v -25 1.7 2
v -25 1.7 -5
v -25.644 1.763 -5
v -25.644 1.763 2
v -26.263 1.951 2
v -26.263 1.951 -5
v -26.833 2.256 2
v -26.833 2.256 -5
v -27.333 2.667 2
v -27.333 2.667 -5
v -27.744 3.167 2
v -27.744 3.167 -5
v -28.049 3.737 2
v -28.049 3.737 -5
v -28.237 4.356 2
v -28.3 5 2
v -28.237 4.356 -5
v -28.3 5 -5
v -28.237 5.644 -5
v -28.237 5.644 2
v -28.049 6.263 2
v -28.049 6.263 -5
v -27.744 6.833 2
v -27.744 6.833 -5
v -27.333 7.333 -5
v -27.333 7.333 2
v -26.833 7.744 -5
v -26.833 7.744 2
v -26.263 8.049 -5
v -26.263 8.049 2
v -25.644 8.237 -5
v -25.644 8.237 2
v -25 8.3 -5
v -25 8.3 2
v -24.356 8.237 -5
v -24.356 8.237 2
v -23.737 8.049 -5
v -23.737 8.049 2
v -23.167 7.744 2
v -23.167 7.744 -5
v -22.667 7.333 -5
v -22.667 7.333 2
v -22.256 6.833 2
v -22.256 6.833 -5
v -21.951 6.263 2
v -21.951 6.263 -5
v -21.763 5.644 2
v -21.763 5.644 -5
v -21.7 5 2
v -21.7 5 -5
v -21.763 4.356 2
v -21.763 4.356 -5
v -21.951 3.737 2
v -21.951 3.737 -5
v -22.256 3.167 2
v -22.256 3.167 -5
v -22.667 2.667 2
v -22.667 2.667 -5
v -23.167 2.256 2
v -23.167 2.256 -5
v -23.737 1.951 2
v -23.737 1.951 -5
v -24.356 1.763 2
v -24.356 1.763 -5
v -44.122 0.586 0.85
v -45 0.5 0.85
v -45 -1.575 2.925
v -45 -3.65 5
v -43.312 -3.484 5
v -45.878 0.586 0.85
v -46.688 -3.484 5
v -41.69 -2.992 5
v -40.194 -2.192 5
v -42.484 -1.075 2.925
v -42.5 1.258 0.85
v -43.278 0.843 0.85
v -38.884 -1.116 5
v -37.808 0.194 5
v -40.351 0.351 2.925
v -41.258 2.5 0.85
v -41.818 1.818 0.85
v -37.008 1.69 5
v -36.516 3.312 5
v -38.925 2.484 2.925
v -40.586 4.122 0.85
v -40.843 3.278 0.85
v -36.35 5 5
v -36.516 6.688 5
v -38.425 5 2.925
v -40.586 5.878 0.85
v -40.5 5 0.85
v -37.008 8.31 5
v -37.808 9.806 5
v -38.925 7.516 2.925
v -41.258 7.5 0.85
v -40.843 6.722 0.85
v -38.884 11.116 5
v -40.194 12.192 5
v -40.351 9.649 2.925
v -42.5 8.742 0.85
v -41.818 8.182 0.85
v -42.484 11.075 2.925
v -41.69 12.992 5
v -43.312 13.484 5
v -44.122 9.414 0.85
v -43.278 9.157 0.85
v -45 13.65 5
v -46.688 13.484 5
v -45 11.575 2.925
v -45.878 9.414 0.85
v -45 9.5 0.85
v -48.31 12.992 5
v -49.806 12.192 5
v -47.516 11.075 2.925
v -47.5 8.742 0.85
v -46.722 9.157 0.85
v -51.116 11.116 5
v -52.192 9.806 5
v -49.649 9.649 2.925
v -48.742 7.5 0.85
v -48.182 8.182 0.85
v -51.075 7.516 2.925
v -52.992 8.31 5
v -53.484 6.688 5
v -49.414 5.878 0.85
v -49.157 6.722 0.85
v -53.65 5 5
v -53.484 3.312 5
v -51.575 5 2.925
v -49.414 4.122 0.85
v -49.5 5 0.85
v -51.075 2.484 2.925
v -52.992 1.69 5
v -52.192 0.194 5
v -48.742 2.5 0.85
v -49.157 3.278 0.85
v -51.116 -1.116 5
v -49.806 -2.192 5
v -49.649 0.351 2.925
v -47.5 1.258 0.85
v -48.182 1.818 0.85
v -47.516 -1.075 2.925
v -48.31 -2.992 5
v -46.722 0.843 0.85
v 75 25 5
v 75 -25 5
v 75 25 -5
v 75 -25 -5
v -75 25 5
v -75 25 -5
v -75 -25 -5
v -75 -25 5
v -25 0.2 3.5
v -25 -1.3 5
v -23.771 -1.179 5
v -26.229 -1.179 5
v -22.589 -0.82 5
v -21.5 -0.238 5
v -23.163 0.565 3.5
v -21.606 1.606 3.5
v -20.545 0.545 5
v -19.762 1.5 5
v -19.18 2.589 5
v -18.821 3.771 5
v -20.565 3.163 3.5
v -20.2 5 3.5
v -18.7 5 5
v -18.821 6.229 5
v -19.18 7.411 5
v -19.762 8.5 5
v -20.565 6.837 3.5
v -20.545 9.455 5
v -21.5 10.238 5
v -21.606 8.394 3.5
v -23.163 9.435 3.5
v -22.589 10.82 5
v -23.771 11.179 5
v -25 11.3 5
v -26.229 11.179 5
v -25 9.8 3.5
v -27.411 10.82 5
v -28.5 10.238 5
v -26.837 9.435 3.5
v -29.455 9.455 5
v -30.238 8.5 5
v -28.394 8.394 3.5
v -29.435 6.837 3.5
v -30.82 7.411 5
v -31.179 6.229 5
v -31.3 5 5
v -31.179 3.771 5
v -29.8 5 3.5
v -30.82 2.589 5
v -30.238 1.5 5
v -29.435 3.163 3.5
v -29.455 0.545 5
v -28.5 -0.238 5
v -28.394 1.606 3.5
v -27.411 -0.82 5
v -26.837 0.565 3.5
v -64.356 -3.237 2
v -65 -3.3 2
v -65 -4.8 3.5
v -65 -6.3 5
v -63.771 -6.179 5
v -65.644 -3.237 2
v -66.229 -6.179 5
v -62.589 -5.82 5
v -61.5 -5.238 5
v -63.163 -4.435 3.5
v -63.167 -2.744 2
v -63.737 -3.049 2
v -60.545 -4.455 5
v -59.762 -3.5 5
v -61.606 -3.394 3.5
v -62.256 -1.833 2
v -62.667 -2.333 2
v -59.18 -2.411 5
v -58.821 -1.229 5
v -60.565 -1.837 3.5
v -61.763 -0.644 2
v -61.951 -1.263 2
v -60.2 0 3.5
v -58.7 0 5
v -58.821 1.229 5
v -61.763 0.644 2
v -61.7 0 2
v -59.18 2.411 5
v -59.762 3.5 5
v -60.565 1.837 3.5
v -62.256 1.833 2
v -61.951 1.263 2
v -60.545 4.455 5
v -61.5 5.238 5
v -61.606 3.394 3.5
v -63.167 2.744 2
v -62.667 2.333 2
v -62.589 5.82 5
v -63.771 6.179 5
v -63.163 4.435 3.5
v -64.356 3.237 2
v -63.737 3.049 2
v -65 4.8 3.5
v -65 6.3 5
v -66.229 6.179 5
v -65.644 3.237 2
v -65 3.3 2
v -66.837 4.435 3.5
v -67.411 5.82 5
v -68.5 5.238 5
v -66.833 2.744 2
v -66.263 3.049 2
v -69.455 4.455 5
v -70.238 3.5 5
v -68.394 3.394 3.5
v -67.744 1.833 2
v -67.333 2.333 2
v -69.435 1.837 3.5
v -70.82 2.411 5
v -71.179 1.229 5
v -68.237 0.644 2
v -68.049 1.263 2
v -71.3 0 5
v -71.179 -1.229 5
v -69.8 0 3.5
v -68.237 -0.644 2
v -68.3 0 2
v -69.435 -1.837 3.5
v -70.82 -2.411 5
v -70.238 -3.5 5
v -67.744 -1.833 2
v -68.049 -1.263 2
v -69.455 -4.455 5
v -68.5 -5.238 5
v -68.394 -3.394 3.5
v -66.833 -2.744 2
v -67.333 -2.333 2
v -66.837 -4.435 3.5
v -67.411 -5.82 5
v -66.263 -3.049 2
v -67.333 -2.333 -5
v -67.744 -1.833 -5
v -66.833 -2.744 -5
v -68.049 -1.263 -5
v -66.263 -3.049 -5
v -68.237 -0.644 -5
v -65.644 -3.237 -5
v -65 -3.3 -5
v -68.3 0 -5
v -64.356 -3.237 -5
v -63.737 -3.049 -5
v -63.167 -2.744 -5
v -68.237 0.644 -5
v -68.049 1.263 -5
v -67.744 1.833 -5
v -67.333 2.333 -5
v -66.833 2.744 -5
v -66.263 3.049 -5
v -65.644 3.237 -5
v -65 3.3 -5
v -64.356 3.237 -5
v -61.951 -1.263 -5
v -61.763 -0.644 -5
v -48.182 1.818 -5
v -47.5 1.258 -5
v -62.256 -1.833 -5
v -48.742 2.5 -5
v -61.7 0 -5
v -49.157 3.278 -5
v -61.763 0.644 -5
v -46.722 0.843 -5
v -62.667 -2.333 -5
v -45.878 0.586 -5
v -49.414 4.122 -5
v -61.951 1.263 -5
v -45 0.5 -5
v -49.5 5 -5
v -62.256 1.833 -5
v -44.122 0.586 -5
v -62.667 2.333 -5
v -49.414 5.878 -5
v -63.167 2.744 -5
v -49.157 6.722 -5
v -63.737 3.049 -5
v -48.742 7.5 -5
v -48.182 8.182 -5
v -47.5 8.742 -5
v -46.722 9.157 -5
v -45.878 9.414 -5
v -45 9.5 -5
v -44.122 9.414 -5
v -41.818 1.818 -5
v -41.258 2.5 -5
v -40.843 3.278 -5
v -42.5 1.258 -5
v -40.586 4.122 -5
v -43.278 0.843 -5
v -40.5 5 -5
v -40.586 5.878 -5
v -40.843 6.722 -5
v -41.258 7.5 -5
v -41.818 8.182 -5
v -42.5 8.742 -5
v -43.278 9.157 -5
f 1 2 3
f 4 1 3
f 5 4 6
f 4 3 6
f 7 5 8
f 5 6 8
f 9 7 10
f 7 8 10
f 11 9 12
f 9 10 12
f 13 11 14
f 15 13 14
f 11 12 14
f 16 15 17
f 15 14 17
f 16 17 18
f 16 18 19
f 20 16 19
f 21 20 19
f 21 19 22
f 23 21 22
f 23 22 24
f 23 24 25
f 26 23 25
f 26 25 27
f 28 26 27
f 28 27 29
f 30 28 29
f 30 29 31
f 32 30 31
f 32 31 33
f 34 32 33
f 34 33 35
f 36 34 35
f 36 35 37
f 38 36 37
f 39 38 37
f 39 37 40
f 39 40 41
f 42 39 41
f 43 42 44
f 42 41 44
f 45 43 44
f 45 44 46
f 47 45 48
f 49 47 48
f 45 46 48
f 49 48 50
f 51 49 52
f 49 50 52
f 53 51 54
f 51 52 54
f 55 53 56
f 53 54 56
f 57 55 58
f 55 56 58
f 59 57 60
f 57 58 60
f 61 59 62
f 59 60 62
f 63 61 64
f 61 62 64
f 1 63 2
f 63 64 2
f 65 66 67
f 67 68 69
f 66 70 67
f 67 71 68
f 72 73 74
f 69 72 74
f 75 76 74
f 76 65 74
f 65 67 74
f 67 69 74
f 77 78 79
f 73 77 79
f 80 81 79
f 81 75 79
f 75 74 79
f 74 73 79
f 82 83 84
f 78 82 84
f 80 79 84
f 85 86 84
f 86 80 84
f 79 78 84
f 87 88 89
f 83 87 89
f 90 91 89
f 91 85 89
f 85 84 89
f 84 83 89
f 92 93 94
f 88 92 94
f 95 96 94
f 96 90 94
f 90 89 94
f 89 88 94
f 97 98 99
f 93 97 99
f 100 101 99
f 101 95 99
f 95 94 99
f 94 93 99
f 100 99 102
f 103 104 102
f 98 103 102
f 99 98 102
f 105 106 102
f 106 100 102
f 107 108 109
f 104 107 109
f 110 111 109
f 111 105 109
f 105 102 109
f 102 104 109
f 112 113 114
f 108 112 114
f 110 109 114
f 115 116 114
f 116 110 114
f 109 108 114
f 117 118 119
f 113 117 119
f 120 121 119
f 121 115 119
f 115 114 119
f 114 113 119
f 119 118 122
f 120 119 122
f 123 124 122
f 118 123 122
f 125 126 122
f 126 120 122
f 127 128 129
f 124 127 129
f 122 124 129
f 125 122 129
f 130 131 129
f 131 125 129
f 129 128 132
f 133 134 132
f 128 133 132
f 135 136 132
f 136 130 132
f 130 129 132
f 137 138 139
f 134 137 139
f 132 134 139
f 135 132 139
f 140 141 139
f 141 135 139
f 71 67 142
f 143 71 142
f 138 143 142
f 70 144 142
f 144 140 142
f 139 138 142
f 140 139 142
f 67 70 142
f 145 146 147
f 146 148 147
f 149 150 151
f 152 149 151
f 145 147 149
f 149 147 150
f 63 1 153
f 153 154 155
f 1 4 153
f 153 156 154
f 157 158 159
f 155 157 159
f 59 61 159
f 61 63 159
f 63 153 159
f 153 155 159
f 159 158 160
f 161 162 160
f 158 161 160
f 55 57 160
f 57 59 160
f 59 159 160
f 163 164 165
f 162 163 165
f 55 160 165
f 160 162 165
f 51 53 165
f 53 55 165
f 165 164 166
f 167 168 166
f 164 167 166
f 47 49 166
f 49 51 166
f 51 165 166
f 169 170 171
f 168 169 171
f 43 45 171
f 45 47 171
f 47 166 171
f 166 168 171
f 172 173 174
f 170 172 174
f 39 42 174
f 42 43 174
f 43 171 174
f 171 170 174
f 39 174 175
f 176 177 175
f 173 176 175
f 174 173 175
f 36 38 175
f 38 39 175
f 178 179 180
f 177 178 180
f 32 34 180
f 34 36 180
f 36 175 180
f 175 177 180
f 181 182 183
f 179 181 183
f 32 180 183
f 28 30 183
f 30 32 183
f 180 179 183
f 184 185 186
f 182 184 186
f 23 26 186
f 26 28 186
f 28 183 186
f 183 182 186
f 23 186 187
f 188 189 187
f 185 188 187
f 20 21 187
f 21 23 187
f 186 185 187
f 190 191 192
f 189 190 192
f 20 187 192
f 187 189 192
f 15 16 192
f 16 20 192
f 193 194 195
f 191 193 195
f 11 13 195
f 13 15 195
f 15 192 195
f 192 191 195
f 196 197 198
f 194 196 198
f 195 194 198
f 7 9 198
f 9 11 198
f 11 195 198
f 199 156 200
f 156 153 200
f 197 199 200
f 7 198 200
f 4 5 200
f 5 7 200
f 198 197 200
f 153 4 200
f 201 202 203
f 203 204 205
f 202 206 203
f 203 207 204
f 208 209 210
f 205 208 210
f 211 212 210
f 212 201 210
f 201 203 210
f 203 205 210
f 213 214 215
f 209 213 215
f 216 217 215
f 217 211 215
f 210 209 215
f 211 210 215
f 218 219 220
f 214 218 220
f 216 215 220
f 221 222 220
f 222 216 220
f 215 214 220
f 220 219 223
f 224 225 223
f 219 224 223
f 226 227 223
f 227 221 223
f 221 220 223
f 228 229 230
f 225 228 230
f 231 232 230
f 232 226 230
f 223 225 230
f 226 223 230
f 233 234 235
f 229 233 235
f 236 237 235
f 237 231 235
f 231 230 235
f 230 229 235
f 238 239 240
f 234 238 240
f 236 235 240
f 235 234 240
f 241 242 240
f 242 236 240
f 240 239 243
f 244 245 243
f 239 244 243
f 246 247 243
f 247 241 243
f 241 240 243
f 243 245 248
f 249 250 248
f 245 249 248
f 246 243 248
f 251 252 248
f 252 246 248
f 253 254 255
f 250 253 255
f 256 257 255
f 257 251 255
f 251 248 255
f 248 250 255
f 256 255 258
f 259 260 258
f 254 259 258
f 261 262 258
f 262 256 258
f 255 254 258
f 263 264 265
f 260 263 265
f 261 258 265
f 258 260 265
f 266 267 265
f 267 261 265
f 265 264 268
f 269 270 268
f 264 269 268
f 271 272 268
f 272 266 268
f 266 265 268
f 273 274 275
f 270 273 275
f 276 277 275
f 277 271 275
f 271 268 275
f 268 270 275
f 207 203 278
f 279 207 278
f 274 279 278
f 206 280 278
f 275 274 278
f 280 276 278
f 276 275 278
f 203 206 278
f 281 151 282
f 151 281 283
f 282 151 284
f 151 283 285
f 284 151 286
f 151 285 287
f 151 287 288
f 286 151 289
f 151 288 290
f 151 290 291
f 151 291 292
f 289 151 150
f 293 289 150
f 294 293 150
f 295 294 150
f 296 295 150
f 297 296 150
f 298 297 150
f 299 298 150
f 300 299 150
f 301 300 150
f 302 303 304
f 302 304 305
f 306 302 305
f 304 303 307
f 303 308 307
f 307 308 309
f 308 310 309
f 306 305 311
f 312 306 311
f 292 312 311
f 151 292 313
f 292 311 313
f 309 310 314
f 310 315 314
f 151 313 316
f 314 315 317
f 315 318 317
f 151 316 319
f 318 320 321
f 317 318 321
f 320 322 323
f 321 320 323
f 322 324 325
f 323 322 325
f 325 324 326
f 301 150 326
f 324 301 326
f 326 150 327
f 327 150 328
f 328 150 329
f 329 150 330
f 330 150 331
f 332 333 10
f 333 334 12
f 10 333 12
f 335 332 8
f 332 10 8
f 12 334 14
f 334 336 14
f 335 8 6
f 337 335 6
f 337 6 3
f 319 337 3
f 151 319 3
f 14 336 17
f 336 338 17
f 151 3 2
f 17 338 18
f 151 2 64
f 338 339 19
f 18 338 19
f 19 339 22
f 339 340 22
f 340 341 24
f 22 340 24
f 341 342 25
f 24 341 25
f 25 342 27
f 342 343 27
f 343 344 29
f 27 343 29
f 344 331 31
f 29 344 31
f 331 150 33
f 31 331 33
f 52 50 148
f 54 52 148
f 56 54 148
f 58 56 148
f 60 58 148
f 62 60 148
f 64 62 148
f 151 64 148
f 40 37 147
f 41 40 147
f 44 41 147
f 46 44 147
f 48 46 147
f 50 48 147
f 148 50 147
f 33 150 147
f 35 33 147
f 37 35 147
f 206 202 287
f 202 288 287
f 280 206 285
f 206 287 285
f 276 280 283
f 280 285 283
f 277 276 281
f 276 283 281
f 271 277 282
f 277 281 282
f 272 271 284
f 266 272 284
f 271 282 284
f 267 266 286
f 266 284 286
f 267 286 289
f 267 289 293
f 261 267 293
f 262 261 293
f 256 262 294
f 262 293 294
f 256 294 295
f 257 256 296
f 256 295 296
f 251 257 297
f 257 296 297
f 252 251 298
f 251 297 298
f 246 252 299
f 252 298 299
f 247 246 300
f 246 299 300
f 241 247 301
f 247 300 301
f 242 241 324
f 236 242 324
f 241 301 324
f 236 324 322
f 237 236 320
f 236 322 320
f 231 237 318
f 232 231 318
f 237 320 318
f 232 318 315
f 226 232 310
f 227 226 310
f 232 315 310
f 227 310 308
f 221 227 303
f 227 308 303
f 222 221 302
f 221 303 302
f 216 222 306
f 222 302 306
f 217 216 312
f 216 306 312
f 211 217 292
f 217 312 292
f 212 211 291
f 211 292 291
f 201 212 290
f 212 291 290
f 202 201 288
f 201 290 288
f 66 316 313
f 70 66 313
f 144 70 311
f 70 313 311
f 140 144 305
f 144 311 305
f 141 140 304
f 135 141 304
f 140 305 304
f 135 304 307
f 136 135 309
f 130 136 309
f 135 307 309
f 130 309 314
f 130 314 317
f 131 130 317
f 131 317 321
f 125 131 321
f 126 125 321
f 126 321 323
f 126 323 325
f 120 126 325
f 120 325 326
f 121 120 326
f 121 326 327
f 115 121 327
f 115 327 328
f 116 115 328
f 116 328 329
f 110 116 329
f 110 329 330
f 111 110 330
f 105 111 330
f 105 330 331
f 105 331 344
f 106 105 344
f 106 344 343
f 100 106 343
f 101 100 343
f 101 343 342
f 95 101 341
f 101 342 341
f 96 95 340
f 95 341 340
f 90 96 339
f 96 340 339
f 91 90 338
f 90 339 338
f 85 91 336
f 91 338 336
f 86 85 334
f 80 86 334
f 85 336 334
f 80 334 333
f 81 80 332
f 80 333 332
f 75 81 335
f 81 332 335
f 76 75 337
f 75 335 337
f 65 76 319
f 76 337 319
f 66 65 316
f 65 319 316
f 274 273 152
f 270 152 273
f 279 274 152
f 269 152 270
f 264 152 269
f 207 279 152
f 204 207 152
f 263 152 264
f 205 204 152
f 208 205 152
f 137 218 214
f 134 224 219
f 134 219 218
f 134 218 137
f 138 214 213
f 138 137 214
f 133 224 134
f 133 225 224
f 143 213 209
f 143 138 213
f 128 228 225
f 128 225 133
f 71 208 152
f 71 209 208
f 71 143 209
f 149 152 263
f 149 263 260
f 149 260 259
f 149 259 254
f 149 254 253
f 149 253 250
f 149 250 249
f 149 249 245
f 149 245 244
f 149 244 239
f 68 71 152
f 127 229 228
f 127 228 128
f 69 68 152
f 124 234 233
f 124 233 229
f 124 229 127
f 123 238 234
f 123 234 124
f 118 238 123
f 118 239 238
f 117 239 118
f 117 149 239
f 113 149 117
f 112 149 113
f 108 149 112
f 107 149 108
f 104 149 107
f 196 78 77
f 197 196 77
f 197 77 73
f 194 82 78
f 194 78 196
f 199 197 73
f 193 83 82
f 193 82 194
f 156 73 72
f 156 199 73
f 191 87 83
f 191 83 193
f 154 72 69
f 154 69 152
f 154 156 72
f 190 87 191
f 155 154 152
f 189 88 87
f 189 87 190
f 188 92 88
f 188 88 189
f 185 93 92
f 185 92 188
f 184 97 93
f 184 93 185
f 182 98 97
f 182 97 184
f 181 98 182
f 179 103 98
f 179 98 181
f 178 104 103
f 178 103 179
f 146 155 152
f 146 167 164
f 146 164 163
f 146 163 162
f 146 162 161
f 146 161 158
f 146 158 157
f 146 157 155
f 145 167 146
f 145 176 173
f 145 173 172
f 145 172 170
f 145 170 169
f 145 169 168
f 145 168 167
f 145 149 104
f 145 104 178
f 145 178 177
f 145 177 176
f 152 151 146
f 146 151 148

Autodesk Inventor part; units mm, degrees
ref_plane "YZ Plane" through (0, 0, 0) normal (1, 0, 0) x (0, 1, 0)
ref_plane "XZ Plane" through (0, 0, 0) normal (0, 1, 0) x (-1, 0, 0)
ref_plane "XY Plane" through (0, 0, 0) normal (0, 0, 1) x (1, 0, 0)
sketch "Sketch2" plane through (0, 0, 0) normal (0, 0, 1) x (1, 0, 0)
  line L0 (-75, -25) -> (75, -25)
  line L1 (75, -25) -> (75, 25)
  line L2 (75, 25) -> (-75, 25)
  line L3 (-75, 25) -> (-75, -25)
  line L4 (-75, -25) -> (75, 25) construction
  line L5 (75, -25) -> (-75, 25) construction
  point P0 (0, 0)
  dimension "d1" = 150
  dimension "d2" = 50
extrude "Extrusion1" add sketch "Sketch2" along normal mid plane 10
sketch "Sketch3" plane through (0, 0, 5) normal (0, 0, 1) x (1, 0, 0)
  line L0 (-75, 25) -> (-75, -25) projected
  line L1 (75, 25) -> (-75, 25) projected
  point P0 (0, 0)
  point P1 (-65, 0)
  dimension "d40" = 10
  dimension "d43" = 25
hole "Hole1" at (-65, 0, 5) direction (0, 0, -1) diameter 6.6 depth 14.2 tip angle 118 countersink diameter 12.6 countersink angle 90 clearance for "Counter Sink" size "M6" standard "TS Profile"
sketch "Sketch4" plane through (0, 0, 5) normal (0, 0, 1) x (1, 0, 0)
  line L0 (-75, 25) -> (-75, -25) projected
  line L1 (75, 25) -> (-75, 25) projected
  point P0 (0, 0)
  point P1 (-45, 5)
  dimension "d41" = 30
  dimension "d42" = 20
hole "Hole2" at (-45, 5, 5) direction (0, 0, -1) diameter 9 depth 14.2 tip angle 118 countersink diameter 17.3 countersink angle 90 clearance for "Counter Sink" size "M8" standard "TS Profile"
sketch "Sketch5" plane through (0, 0, 5) normal (0, 0, 1) x (1, 0, 0)
  line L0 (-75, 25) -> (-75, -25) projected
  line L1 (75, 25) -> (-75, 25) projected
  point P0 (0, 0)
  point P1 (-25, 5)
  dimension "d44" = 50
  dimension "d45" = 20
hole "Hole3" at (-25, 5, 5) direction (0, 0, -1) diameter 6.6 depth 14.2 tip angle 118 countersink diameter 12.6 countersink angle 90 clearance for "Counter Sink" size "M6" standard "TS Profile"
properties part number "홀간 거리 확인 파트-10_CPY" material "SS400"
